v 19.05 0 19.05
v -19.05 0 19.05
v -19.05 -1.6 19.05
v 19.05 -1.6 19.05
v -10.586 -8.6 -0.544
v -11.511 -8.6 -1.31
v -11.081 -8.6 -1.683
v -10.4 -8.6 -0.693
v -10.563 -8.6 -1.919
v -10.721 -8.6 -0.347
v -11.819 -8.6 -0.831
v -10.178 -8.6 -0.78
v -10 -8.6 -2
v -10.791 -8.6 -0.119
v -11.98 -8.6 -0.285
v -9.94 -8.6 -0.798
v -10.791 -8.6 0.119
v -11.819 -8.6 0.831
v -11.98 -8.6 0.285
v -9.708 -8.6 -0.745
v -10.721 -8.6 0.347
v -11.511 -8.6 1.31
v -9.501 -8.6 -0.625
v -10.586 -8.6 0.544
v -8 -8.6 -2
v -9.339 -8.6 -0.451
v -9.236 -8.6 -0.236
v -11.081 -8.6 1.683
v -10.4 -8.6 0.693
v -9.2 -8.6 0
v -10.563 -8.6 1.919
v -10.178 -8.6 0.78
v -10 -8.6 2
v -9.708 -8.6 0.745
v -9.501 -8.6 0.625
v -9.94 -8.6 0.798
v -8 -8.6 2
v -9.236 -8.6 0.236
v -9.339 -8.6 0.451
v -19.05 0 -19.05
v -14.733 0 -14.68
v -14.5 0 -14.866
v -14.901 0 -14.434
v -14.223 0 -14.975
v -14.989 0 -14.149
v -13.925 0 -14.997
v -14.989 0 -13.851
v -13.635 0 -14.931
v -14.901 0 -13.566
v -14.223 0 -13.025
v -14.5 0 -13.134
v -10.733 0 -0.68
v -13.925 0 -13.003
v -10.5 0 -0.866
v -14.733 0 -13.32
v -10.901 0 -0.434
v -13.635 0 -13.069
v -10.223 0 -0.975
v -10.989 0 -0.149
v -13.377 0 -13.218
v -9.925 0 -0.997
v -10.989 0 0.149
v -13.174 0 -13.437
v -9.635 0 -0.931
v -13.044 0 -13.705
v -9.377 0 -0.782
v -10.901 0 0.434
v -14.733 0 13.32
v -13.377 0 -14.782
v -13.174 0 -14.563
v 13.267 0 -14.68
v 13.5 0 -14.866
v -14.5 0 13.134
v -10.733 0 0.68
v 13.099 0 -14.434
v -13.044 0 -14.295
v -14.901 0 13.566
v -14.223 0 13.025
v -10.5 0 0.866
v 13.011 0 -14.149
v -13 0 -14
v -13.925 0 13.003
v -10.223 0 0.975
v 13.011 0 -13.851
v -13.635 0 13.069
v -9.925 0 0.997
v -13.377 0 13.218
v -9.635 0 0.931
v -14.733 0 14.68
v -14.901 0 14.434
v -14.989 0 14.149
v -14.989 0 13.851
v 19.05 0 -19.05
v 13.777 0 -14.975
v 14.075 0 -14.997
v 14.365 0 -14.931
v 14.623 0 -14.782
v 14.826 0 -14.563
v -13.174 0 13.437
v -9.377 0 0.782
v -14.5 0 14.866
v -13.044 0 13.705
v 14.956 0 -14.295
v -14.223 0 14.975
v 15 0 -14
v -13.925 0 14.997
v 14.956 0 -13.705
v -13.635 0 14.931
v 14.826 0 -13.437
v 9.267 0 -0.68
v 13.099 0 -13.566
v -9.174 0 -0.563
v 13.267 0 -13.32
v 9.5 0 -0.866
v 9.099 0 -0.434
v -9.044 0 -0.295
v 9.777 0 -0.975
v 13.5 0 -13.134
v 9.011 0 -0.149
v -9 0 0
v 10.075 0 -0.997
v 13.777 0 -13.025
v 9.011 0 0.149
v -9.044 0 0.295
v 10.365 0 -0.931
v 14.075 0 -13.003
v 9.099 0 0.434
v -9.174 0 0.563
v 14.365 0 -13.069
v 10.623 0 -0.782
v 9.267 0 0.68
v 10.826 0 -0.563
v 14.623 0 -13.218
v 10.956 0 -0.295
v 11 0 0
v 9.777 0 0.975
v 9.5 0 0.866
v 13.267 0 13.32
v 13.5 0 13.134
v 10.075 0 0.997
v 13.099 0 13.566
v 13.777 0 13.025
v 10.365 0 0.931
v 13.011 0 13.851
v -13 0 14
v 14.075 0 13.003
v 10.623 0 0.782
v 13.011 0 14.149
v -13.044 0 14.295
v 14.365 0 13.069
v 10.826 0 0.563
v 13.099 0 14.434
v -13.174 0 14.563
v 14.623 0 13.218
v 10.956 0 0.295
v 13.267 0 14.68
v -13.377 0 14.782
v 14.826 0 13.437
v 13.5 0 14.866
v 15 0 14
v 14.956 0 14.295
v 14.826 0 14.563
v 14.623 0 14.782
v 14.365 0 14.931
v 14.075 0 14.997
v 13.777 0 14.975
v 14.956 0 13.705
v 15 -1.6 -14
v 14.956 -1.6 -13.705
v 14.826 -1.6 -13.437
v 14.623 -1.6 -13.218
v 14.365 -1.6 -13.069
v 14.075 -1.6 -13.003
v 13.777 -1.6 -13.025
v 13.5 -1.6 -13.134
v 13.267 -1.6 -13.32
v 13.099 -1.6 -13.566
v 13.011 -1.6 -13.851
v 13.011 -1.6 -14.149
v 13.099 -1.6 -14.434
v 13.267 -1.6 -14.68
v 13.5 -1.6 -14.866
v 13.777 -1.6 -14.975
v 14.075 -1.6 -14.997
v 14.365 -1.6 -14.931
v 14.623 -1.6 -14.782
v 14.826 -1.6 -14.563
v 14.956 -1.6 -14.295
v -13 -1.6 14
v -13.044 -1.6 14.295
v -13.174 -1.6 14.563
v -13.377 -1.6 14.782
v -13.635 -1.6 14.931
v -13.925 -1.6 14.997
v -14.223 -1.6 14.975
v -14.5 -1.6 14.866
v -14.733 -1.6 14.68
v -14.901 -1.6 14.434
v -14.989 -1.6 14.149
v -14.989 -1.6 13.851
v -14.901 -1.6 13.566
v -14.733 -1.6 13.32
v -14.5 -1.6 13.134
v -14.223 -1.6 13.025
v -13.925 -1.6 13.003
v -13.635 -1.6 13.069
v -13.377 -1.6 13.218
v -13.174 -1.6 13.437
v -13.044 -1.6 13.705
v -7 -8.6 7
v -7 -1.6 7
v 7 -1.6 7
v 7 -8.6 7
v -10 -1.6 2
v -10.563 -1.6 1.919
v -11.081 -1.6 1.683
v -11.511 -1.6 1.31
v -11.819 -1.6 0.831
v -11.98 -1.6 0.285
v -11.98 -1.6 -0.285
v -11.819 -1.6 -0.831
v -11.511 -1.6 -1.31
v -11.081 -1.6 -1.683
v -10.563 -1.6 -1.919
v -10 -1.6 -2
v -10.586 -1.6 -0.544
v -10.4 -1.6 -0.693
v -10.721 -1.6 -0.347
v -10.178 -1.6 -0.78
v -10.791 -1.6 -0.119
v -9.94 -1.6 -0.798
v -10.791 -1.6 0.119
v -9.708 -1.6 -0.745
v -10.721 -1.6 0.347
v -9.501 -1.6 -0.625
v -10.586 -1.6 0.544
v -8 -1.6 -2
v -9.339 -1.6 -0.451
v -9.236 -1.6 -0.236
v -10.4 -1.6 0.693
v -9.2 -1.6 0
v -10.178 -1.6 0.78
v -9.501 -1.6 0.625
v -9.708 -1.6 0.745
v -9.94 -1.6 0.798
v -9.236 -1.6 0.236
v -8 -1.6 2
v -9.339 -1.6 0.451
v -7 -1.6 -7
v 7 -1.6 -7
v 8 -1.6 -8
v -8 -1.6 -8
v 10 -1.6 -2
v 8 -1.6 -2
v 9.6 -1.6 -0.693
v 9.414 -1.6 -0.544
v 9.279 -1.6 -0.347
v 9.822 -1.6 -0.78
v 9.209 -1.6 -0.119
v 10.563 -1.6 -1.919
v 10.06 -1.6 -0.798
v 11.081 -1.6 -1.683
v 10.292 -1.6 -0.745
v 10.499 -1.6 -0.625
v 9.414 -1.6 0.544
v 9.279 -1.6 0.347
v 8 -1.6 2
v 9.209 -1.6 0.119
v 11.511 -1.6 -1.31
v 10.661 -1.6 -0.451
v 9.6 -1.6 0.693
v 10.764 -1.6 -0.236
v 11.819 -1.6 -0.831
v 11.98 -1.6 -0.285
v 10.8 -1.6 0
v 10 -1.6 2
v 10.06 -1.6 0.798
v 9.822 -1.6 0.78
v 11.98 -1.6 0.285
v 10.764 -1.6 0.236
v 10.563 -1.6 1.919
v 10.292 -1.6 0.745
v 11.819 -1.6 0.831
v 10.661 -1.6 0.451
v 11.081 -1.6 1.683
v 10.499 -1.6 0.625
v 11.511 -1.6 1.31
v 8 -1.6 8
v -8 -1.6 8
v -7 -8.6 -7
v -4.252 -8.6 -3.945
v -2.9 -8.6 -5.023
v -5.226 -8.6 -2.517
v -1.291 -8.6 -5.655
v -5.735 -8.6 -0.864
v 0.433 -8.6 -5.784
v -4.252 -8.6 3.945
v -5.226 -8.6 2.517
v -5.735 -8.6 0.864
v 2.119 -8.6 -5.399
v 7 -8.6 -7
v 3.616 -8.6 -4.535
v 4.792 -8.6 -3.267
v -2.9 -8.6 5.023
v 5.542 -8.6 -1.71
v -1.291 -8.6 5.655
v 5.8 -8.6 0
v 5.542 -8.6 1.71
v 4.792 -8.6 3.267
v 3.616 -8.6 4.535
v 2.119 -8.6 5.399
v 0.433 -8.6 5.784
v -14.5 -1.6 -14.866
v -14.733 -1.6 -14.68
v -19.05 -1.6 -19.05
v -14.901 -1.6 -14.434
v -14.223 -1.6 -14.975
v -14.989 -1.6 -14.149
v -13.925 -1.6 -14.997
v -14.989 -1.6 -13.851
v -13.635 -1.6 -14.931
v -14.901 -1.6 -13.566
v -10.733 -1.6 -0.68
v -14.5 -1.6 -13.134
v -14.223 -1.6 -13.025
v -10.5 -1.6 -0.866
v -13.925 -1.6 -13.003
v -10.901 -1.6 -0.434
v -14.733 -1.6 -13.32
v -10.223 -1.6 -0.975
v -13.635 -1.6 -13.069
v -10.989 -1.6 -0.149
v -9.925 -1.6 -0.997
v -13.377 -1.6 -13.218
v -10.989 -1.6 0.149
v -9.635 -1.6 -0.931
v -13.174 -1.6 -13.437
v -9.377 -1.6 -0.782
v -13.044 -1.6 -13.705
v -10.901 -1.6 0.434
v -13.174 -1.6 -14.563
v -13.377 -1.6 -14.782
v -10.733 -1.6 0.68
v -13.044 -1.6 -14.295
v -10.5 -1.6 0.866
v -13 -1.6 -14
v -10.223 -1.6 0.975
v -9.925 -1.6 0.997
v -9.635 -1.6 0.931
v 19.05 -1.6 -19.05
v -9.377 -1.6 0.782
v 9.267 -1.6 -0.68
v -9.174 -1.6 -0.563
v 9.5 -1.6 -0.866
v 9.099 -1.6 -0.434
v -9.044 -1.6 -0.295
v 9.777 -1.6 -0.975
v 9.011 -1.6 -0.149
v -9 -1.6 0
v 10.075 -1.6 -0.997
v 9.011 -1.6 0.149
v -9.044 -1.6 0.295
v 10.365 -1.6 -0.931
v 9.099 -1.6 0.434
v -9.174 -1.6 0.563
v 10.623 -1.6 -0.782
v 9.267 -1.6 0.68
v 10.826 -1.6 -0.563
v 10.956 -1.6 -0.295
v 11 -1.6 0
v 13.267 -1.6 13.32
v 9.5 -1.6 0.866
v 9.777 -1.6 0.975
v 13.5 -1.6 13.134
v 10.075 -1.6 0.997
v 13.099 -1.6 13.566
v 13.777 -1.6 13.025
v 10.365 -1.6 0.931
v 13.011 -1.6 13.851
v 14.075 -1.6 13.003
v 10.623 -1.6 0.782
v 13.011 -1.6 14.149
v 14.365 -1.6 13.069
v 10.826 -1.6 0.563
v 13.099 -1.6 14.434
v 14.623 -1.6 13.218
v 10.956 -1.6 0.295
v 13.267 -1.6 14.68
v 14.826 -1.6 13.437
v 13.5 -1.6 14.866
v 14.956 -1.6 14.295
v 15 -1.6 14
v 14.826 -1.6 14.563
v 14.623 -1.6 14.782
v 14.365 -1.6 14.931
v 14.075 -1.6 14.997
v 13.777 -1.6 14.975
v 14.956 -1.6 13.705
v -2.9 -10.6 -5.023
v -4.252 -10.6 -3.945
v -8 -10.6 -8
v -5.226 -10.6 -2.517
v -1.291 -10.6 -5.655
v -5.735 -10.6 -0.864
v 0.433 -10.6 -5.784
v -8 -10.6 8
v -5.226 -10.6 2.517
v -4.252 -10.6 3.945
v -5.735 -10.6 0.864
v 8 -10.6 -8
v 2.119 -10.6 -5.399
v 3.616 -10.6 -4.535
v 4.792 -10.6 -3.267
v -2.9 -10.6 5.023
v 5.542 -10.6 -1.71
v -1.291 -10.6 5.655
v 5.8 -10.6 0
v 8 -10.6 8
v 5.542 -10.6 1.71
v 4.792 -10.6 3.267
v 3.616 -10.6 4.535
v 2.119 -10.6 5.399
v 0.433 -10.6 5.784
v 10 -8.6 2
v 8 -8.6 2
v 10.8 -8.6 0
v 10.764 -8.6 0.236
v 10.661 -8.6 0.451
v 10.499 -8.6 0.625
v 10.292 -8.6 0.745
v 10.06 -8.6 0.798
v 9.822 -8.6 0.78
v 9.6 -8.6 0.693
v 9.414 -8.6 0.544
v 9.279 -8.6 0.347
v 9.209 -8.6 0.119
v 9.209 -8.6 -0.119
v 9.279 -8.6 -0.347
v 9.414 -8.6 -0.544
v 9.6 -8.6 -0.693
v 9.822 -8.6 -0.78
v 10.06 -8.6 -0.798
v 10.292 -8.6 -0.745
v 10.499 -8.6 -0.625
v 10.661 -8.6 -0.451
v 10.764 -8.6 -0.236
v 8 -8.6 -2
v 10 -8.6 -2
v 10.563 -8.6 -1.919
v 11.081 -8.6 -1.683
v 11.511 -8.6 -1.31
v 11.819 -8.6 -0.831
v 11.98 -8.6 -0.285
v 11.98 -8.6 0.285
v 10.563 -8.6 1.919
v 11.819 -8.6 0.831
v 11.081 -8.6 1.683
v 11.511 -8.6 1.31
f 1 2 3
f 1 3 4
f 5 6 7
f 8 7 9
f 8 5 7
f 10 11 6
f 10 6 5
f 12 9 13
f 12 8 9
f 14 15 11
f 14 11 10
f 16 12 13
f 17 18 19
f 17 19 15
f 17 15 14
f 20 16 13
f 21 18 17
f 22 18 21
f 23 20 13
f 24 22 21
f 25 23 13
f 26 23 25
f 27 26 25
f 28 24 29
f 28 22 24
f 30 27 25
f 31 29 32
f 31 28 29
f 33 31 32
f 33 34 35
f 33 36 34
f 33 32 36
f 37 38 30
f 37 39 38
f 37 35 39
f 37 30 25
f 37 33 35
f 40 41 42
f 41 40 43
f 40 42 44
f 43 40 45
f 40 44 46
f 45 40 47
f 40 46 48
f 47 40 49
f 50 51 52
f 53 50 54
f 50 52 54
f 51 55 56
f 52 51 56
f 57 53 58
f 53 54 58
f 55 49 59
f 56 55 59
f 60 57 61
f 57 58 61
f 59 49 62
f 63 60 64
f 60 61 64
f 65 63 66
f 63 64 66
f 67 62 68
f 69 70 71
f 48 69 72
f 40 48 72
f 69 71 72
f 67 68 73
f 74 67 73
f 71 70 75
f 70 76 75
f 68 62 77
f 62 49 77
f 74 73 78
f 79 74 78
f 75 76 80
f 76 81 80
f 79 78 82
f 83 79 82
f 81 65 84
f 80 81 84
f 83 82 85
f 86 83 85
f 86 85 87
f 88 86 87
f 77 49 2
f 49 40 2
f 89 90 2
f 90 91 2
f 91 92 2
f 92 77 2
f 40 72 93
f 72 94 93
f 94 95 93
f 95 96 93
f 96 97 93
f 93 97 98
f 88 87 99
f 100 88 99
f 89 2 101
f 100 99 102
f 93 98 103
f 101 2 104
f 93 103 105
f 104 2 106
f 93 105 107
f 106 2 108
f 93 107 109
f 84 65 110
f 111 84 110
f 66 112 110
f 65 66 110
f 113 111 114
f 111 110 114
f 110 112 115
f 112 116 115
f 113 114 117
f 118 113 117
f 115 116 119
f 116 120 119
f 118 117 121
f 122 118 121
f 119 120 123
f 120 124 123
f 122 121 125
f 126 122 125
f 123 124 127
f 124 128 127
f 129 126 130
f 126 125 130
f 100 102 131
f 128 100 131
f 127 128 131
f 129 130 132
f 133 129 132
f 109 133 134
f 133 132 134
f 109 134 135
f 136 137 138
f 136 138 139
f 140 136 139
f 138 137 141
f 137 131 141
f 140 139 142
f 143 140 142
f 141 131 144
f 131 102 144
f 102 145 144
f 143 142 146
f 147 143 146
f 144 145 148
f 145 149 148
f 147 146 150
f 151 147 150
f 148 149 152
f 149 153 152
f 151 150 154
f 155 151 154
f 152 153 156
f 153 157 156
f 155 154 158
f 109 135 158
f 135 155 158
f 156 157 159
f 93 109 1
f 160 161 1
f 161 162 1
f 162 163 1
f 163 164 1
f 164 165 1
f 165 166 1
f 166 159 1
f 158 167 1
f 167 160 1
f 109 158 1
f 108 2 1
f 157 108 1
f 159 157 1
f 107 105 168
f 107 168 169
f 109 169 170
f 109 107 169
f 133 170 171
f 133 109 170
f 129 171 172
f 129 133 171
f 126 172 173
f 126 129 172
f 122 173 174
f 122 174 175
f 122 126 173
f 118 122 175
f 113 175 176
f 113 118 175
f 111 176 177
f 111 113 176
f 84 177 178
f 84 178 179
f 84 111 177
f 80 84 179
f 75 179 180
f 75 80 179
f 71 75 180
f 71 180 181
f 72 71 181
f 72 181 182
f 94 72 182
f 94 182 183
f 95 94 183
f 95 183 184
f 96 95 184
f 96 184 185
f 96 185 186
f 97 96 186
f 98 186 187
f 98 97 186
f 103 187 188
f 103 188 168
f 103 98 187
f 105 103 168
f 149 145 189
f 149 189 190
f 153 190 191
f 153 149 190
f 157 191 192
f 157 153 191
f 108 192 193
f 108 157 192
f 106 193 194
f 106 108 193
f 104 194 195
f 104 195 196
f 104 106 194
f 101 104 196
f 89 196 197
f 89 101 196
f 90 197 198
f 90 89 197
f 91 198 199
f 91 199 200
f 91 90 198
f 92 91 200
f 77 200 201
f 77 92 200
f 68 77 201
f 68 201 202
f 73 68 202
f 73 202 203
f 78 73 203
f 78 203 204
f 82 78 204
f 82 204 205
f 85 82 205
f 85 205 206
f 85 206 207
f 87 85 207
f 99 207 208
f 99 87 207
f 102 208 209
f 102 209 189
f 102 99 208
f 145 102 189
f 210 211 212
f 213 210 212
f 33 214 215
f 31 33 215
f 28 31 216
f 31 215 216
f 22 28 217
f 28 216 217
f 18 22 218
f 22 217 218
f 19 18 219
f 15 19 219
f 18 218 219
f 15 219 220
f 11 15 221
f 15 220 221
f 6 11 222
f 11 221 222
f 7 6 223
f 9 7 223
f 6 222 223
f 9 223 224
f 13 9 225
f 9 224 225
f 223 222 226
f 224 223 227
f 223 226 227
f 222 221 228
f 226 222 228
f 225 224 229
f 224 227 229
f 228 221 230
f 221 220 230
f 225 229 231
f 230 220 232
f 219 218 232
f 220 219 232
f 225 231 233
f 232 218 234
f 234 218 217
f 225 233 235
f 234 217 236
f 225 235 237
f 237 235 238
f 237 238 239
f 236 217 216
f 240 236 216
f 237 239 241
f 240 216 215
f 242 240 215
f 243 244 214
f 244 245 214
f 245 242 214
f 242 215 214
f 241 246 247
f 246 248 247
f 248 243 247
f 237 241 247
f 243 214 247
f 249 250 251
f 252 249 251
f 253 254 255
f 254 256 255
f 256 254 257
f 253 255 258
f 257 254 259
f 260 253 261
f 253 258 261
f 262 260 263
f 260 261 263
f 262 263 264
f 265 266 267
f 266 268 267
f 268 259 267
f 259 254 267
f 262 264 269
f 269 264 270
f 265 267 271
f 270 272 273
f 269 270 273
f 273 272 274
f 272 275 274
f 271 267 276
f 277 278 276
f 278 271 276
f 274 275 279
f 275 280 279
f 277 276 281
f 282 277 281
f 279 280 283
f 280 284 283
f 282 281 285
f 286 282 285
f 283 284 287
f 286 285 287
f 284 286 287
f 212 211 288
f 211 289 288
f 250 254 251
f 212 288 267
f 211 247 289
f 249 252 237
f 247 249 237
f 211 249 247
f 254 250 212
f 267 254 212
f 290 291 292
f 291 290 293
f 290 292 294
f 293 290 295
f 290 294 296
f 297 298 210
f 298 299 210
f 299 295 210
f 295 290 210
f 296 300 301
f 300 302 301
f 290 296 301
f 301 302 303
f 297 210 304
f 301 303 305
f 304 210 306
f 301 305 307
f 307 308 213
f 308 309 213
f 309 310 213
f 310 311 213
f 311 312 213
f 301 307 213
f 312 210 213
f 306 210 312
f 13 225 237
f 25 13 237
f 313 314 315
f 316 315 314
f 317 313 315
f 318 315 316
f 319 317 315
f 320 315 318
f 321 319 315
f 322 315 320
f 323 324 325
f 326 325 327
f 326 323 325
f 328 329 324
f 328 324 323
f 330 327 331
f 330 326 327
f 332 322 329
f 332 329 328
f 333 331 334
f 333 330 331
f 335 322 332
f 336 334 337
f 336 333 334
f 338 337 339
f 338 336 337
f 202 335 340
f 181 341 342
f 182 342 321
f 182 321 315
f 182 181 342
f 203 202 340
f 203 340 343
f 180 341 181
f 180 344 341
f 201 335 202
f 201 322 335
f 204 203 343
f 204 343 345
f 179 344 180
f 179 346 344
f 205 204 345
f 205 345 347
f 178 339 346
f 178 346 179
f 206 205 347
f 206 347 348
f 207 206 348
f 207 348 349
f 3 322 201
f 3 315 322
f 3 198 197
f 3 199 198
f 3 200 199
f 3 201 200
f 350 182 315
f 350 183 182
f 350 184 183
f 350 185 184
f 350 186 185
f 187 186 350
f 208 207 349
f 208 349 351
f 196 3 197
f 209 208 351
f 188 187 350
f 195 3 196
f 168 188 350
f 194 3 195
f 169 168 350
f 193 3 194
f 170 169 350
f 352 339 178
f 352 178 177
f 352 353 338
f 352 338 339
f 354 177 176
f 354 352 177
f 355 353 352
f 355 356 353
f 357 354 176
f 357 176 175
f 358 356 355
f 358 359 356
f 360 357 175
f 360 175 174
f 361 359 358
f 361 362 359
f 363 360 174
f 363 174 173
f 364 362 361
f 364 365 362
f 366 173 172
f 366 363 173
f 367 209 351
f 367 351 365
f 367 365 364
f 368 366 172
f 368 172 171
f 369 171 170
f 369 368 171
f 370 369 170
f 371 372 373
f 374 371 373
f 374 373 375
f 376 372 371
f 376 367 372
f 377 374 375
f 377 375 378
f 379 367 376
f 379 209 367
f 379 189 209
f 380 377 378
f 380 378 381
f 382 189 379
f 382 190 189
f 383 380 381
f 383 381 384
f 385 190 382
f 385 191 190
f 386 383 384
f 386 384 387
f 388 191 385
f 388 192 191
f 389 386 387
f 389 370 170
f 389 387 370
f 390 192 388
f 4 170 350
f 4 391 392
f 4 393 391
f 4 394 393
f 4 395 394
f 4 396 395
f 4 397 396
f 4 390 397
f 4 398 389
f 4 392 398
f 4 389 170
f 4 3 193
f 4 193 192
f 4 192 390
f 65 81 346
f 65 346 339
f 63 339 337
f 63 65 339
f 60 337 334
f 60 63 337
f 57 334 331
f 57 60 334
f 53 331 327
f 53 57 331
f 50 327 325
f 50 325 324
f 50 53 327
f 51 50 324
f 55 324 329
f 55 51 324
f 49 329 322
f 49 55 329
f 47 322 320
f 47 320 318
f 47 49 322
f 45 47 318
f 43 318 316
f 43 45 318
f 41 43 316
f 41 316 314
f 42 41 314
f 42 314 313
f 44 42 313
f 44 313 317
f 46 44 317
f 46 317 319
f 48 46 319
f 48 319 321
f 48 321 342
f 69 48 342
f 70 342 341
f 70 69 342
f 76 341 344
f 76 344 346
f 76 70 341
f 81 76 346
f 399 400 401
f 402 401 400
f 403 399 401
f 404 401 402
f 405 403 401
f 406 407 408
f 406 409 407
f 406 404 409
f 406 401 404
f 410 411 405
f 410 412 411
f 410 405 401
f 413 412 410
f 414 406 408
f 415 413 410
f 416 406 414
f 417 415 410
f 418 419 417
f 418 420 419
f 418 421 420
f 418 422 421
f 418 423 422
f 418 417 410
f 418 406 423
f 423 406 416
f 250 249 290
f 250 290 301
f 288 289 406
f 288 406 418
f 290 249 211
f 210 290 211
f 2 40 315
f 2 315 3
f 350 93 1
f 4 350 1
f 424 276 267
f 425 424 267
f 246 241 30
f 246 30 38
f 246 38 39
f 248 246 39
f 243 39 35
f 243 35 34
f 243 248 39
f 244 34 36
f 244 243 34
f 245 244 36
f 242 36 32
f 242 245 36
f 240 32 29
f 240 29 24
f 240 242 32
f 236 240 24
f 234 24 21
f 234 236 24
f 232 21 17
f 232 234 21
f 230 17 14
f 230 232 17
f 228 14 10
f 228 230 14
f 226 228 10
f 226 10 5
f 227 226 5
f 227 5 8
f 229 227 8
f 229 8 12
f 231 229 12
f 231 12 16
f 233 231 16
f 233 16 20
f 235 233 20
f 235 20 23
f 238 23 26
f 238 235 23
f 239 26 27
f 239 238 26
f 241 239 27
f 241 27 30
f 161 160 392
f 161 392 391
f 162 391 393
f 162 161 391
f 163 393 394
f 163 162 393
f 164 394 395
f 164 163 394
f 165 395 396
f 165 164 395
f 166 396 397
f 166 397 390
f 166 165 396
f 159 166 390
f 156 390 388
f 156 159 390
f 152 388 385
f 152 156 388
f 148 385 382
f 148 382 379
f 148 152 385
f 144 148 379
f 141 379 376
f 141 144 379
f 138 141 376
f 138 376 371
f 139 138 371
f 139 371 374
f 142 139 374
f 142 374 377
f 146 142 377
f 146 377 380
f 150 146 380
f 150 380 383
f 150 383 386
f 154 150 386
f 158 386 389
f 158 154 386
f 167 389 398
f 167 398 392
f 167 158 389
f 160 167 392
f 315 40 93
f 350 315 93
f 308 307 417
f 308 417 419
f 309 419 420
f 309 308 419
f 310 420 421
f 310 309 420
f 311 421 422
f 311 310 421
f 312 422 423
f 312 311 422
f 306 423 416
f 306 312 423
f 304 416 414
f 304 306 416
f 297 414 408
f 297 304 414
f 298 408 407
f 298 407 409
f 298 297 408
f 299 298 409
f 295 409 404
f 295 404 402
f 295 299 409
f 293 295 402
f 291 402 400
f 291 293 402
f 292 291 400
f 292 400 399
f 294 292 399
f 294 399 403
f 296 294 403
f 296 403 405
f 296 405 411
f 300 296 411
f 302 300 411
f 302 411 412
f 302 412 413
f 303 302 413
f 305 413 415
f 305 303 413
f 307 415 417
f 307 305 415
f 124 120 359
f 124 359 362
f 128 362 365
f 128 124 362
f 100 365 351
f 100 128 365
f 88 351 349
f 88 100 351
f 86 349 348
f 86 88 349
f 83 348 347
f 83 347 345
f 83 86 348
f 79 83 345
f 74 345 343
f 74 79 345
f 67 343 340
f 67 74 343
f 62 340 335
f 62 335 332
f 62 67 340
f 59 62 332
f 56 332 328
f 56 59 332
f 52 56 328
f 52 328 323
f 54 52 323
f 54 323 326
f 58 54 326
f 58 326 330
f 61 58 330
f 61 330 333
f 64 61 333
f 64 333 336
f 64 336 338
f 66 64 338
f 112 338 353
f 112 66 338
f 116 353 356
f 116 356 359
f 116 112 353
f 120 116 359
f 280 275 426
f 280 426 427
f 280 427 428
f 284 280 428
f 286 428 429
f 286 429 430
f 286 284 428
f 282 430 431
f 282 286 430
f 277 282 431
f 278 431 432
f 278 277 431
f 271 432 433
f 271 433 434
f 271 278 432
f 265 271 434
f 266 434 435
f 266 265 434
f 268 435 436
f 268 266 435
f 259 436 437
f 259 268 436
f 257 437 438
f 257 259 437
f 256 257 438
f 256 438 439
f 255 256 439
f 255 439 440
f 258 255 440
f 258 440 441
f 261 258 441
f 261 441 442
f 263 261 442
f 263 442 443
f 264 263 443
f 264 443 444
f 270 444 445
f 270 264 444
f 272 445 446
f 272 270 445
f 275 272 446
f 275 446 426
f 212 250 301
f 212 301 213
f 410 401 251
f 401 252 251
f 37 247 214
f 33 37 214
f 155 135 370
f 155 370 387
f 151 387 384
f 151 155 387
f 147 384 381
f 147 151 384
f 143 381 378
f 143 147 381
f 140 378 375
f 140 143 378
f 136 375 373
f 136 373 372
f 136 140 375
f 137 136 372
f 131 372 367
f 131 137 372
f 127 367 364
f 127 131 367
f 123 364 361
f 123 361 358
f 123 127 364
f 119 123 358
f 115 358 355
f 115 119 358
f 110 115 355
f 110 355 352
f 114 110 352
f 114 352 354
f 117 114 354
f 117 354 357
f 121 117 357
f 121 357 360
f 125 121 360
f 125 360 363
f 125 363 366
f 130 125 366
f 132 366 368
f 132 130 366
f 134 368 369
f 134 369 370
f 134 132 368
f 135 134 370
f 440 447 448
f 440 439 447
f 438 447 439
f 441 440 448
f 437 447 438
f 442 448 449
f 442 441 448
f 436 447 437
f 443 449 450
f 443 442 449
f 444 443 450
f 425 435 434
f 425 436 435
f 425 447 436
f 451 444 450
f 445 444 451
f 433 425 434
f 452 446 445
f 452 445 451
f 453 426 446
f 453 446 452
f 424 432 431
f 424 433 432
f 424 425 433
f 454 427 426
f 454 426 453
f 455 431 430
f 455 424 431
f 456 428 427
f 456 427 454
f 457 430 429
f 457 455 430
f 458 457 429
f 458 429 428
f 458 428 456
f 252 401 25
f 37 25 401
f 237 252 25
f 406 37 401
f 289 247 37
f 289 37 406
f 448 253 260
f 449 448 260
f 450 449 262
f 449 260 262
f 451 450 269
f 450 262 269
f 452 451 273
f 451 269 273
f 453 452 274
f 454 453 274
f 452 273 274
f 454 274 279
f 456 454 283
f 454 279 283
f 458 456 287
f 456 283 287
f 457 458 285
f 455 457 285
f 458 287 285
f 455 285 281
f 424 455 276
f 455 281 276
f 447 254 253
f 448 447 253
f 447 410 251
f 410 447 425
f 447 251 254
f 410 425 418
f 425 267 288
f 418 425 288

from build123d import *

# Parameters (mm, degrees)
F0_W     = 38.1
F0_H     = 38.1
F0_R     = 1
F1_DEPTH = 1.6
F2_R     = 0.8
F2_W     = 14
F2_H     = 14
F3_DEPTH = 7
F4_W     = 16
F4_H     = 16
F4_R     = 5.8
F5_DEPTH = 2


with BuildPart() as f1:
    # F0 (on Front) → F1 (new body)
    with BuildSketch(Plane.XZ):
        Rectangle(F0_W, F0_H)
        with Locations((-14, -14)):
            Circle(F0_R, mode=Mode.SUBTRACT)
        with Locations((14, -14)):
            Circle(F0_R, mode=Mode.SUBTRACT)
        with Locations((-10, 0)):
            Circle(F0_R, mode=Mode.SUBTRACT)
        with Locations((-14, 14)):
            Circle(F0_R, mode=Mode.SUBTRACT)
        with Locations((10, 0)):
            Circle(F0_R, mode=Mode.SUBTRACT)
        with Locations((14, 14)):
            Circle(F0_R, mode=Mode.SUBTRACT)
    extrude(amount=F1_DEPTH)


with BuildPart() as f3:
    # F2 (on face) → F3 (new body)
    with BuildSketch(Plane.XZ.offset(1.6)):
        with BuildLine():
            Line((-8, -8), (8, -8))
            Line((8, -8), (8, -2))
            Line((8, -2), (10, -2))
            ThreePointArc((10, -2), (12, 0), (10, 2))
            Line((10, 2), (8, 2))
            Line((8, 2), (8, 8))
            Line((8, 8), (-8, 8))
            Line((-8, 8), (-8, 2))
            Line((-8, 2), (-10, 2))
            ThreePointArc((-10, 2), (-12, 0), (-10, -2))
            Line((-10, -2), (-8, -2))
            Line((-8, -2), (-8, -8))
        make_face()
        with Locations((-10, 0)):
            Circle(F2_R, mode=Mode.SUBTRACT)
        Rectangle(F2_W, F2_H, mode=Mode.SUBTRACT)
        with Locations((10, 0)):
            Circle(F2_R, mode=Mode.SUBTRACT)
    extrude(amount=F3_DEPTH)

    # F4 (on face) → F5 (join)
    with BuildSketch(Plane.XZ.offset(8.6)):
        Rectangle(F4_W, F4_H)
        Circle(F4_R, mode=Mode.SUBTRACT)
    extrude(amount=F5_DEPTH)


solid = Compound([f1.part, f3.part])
